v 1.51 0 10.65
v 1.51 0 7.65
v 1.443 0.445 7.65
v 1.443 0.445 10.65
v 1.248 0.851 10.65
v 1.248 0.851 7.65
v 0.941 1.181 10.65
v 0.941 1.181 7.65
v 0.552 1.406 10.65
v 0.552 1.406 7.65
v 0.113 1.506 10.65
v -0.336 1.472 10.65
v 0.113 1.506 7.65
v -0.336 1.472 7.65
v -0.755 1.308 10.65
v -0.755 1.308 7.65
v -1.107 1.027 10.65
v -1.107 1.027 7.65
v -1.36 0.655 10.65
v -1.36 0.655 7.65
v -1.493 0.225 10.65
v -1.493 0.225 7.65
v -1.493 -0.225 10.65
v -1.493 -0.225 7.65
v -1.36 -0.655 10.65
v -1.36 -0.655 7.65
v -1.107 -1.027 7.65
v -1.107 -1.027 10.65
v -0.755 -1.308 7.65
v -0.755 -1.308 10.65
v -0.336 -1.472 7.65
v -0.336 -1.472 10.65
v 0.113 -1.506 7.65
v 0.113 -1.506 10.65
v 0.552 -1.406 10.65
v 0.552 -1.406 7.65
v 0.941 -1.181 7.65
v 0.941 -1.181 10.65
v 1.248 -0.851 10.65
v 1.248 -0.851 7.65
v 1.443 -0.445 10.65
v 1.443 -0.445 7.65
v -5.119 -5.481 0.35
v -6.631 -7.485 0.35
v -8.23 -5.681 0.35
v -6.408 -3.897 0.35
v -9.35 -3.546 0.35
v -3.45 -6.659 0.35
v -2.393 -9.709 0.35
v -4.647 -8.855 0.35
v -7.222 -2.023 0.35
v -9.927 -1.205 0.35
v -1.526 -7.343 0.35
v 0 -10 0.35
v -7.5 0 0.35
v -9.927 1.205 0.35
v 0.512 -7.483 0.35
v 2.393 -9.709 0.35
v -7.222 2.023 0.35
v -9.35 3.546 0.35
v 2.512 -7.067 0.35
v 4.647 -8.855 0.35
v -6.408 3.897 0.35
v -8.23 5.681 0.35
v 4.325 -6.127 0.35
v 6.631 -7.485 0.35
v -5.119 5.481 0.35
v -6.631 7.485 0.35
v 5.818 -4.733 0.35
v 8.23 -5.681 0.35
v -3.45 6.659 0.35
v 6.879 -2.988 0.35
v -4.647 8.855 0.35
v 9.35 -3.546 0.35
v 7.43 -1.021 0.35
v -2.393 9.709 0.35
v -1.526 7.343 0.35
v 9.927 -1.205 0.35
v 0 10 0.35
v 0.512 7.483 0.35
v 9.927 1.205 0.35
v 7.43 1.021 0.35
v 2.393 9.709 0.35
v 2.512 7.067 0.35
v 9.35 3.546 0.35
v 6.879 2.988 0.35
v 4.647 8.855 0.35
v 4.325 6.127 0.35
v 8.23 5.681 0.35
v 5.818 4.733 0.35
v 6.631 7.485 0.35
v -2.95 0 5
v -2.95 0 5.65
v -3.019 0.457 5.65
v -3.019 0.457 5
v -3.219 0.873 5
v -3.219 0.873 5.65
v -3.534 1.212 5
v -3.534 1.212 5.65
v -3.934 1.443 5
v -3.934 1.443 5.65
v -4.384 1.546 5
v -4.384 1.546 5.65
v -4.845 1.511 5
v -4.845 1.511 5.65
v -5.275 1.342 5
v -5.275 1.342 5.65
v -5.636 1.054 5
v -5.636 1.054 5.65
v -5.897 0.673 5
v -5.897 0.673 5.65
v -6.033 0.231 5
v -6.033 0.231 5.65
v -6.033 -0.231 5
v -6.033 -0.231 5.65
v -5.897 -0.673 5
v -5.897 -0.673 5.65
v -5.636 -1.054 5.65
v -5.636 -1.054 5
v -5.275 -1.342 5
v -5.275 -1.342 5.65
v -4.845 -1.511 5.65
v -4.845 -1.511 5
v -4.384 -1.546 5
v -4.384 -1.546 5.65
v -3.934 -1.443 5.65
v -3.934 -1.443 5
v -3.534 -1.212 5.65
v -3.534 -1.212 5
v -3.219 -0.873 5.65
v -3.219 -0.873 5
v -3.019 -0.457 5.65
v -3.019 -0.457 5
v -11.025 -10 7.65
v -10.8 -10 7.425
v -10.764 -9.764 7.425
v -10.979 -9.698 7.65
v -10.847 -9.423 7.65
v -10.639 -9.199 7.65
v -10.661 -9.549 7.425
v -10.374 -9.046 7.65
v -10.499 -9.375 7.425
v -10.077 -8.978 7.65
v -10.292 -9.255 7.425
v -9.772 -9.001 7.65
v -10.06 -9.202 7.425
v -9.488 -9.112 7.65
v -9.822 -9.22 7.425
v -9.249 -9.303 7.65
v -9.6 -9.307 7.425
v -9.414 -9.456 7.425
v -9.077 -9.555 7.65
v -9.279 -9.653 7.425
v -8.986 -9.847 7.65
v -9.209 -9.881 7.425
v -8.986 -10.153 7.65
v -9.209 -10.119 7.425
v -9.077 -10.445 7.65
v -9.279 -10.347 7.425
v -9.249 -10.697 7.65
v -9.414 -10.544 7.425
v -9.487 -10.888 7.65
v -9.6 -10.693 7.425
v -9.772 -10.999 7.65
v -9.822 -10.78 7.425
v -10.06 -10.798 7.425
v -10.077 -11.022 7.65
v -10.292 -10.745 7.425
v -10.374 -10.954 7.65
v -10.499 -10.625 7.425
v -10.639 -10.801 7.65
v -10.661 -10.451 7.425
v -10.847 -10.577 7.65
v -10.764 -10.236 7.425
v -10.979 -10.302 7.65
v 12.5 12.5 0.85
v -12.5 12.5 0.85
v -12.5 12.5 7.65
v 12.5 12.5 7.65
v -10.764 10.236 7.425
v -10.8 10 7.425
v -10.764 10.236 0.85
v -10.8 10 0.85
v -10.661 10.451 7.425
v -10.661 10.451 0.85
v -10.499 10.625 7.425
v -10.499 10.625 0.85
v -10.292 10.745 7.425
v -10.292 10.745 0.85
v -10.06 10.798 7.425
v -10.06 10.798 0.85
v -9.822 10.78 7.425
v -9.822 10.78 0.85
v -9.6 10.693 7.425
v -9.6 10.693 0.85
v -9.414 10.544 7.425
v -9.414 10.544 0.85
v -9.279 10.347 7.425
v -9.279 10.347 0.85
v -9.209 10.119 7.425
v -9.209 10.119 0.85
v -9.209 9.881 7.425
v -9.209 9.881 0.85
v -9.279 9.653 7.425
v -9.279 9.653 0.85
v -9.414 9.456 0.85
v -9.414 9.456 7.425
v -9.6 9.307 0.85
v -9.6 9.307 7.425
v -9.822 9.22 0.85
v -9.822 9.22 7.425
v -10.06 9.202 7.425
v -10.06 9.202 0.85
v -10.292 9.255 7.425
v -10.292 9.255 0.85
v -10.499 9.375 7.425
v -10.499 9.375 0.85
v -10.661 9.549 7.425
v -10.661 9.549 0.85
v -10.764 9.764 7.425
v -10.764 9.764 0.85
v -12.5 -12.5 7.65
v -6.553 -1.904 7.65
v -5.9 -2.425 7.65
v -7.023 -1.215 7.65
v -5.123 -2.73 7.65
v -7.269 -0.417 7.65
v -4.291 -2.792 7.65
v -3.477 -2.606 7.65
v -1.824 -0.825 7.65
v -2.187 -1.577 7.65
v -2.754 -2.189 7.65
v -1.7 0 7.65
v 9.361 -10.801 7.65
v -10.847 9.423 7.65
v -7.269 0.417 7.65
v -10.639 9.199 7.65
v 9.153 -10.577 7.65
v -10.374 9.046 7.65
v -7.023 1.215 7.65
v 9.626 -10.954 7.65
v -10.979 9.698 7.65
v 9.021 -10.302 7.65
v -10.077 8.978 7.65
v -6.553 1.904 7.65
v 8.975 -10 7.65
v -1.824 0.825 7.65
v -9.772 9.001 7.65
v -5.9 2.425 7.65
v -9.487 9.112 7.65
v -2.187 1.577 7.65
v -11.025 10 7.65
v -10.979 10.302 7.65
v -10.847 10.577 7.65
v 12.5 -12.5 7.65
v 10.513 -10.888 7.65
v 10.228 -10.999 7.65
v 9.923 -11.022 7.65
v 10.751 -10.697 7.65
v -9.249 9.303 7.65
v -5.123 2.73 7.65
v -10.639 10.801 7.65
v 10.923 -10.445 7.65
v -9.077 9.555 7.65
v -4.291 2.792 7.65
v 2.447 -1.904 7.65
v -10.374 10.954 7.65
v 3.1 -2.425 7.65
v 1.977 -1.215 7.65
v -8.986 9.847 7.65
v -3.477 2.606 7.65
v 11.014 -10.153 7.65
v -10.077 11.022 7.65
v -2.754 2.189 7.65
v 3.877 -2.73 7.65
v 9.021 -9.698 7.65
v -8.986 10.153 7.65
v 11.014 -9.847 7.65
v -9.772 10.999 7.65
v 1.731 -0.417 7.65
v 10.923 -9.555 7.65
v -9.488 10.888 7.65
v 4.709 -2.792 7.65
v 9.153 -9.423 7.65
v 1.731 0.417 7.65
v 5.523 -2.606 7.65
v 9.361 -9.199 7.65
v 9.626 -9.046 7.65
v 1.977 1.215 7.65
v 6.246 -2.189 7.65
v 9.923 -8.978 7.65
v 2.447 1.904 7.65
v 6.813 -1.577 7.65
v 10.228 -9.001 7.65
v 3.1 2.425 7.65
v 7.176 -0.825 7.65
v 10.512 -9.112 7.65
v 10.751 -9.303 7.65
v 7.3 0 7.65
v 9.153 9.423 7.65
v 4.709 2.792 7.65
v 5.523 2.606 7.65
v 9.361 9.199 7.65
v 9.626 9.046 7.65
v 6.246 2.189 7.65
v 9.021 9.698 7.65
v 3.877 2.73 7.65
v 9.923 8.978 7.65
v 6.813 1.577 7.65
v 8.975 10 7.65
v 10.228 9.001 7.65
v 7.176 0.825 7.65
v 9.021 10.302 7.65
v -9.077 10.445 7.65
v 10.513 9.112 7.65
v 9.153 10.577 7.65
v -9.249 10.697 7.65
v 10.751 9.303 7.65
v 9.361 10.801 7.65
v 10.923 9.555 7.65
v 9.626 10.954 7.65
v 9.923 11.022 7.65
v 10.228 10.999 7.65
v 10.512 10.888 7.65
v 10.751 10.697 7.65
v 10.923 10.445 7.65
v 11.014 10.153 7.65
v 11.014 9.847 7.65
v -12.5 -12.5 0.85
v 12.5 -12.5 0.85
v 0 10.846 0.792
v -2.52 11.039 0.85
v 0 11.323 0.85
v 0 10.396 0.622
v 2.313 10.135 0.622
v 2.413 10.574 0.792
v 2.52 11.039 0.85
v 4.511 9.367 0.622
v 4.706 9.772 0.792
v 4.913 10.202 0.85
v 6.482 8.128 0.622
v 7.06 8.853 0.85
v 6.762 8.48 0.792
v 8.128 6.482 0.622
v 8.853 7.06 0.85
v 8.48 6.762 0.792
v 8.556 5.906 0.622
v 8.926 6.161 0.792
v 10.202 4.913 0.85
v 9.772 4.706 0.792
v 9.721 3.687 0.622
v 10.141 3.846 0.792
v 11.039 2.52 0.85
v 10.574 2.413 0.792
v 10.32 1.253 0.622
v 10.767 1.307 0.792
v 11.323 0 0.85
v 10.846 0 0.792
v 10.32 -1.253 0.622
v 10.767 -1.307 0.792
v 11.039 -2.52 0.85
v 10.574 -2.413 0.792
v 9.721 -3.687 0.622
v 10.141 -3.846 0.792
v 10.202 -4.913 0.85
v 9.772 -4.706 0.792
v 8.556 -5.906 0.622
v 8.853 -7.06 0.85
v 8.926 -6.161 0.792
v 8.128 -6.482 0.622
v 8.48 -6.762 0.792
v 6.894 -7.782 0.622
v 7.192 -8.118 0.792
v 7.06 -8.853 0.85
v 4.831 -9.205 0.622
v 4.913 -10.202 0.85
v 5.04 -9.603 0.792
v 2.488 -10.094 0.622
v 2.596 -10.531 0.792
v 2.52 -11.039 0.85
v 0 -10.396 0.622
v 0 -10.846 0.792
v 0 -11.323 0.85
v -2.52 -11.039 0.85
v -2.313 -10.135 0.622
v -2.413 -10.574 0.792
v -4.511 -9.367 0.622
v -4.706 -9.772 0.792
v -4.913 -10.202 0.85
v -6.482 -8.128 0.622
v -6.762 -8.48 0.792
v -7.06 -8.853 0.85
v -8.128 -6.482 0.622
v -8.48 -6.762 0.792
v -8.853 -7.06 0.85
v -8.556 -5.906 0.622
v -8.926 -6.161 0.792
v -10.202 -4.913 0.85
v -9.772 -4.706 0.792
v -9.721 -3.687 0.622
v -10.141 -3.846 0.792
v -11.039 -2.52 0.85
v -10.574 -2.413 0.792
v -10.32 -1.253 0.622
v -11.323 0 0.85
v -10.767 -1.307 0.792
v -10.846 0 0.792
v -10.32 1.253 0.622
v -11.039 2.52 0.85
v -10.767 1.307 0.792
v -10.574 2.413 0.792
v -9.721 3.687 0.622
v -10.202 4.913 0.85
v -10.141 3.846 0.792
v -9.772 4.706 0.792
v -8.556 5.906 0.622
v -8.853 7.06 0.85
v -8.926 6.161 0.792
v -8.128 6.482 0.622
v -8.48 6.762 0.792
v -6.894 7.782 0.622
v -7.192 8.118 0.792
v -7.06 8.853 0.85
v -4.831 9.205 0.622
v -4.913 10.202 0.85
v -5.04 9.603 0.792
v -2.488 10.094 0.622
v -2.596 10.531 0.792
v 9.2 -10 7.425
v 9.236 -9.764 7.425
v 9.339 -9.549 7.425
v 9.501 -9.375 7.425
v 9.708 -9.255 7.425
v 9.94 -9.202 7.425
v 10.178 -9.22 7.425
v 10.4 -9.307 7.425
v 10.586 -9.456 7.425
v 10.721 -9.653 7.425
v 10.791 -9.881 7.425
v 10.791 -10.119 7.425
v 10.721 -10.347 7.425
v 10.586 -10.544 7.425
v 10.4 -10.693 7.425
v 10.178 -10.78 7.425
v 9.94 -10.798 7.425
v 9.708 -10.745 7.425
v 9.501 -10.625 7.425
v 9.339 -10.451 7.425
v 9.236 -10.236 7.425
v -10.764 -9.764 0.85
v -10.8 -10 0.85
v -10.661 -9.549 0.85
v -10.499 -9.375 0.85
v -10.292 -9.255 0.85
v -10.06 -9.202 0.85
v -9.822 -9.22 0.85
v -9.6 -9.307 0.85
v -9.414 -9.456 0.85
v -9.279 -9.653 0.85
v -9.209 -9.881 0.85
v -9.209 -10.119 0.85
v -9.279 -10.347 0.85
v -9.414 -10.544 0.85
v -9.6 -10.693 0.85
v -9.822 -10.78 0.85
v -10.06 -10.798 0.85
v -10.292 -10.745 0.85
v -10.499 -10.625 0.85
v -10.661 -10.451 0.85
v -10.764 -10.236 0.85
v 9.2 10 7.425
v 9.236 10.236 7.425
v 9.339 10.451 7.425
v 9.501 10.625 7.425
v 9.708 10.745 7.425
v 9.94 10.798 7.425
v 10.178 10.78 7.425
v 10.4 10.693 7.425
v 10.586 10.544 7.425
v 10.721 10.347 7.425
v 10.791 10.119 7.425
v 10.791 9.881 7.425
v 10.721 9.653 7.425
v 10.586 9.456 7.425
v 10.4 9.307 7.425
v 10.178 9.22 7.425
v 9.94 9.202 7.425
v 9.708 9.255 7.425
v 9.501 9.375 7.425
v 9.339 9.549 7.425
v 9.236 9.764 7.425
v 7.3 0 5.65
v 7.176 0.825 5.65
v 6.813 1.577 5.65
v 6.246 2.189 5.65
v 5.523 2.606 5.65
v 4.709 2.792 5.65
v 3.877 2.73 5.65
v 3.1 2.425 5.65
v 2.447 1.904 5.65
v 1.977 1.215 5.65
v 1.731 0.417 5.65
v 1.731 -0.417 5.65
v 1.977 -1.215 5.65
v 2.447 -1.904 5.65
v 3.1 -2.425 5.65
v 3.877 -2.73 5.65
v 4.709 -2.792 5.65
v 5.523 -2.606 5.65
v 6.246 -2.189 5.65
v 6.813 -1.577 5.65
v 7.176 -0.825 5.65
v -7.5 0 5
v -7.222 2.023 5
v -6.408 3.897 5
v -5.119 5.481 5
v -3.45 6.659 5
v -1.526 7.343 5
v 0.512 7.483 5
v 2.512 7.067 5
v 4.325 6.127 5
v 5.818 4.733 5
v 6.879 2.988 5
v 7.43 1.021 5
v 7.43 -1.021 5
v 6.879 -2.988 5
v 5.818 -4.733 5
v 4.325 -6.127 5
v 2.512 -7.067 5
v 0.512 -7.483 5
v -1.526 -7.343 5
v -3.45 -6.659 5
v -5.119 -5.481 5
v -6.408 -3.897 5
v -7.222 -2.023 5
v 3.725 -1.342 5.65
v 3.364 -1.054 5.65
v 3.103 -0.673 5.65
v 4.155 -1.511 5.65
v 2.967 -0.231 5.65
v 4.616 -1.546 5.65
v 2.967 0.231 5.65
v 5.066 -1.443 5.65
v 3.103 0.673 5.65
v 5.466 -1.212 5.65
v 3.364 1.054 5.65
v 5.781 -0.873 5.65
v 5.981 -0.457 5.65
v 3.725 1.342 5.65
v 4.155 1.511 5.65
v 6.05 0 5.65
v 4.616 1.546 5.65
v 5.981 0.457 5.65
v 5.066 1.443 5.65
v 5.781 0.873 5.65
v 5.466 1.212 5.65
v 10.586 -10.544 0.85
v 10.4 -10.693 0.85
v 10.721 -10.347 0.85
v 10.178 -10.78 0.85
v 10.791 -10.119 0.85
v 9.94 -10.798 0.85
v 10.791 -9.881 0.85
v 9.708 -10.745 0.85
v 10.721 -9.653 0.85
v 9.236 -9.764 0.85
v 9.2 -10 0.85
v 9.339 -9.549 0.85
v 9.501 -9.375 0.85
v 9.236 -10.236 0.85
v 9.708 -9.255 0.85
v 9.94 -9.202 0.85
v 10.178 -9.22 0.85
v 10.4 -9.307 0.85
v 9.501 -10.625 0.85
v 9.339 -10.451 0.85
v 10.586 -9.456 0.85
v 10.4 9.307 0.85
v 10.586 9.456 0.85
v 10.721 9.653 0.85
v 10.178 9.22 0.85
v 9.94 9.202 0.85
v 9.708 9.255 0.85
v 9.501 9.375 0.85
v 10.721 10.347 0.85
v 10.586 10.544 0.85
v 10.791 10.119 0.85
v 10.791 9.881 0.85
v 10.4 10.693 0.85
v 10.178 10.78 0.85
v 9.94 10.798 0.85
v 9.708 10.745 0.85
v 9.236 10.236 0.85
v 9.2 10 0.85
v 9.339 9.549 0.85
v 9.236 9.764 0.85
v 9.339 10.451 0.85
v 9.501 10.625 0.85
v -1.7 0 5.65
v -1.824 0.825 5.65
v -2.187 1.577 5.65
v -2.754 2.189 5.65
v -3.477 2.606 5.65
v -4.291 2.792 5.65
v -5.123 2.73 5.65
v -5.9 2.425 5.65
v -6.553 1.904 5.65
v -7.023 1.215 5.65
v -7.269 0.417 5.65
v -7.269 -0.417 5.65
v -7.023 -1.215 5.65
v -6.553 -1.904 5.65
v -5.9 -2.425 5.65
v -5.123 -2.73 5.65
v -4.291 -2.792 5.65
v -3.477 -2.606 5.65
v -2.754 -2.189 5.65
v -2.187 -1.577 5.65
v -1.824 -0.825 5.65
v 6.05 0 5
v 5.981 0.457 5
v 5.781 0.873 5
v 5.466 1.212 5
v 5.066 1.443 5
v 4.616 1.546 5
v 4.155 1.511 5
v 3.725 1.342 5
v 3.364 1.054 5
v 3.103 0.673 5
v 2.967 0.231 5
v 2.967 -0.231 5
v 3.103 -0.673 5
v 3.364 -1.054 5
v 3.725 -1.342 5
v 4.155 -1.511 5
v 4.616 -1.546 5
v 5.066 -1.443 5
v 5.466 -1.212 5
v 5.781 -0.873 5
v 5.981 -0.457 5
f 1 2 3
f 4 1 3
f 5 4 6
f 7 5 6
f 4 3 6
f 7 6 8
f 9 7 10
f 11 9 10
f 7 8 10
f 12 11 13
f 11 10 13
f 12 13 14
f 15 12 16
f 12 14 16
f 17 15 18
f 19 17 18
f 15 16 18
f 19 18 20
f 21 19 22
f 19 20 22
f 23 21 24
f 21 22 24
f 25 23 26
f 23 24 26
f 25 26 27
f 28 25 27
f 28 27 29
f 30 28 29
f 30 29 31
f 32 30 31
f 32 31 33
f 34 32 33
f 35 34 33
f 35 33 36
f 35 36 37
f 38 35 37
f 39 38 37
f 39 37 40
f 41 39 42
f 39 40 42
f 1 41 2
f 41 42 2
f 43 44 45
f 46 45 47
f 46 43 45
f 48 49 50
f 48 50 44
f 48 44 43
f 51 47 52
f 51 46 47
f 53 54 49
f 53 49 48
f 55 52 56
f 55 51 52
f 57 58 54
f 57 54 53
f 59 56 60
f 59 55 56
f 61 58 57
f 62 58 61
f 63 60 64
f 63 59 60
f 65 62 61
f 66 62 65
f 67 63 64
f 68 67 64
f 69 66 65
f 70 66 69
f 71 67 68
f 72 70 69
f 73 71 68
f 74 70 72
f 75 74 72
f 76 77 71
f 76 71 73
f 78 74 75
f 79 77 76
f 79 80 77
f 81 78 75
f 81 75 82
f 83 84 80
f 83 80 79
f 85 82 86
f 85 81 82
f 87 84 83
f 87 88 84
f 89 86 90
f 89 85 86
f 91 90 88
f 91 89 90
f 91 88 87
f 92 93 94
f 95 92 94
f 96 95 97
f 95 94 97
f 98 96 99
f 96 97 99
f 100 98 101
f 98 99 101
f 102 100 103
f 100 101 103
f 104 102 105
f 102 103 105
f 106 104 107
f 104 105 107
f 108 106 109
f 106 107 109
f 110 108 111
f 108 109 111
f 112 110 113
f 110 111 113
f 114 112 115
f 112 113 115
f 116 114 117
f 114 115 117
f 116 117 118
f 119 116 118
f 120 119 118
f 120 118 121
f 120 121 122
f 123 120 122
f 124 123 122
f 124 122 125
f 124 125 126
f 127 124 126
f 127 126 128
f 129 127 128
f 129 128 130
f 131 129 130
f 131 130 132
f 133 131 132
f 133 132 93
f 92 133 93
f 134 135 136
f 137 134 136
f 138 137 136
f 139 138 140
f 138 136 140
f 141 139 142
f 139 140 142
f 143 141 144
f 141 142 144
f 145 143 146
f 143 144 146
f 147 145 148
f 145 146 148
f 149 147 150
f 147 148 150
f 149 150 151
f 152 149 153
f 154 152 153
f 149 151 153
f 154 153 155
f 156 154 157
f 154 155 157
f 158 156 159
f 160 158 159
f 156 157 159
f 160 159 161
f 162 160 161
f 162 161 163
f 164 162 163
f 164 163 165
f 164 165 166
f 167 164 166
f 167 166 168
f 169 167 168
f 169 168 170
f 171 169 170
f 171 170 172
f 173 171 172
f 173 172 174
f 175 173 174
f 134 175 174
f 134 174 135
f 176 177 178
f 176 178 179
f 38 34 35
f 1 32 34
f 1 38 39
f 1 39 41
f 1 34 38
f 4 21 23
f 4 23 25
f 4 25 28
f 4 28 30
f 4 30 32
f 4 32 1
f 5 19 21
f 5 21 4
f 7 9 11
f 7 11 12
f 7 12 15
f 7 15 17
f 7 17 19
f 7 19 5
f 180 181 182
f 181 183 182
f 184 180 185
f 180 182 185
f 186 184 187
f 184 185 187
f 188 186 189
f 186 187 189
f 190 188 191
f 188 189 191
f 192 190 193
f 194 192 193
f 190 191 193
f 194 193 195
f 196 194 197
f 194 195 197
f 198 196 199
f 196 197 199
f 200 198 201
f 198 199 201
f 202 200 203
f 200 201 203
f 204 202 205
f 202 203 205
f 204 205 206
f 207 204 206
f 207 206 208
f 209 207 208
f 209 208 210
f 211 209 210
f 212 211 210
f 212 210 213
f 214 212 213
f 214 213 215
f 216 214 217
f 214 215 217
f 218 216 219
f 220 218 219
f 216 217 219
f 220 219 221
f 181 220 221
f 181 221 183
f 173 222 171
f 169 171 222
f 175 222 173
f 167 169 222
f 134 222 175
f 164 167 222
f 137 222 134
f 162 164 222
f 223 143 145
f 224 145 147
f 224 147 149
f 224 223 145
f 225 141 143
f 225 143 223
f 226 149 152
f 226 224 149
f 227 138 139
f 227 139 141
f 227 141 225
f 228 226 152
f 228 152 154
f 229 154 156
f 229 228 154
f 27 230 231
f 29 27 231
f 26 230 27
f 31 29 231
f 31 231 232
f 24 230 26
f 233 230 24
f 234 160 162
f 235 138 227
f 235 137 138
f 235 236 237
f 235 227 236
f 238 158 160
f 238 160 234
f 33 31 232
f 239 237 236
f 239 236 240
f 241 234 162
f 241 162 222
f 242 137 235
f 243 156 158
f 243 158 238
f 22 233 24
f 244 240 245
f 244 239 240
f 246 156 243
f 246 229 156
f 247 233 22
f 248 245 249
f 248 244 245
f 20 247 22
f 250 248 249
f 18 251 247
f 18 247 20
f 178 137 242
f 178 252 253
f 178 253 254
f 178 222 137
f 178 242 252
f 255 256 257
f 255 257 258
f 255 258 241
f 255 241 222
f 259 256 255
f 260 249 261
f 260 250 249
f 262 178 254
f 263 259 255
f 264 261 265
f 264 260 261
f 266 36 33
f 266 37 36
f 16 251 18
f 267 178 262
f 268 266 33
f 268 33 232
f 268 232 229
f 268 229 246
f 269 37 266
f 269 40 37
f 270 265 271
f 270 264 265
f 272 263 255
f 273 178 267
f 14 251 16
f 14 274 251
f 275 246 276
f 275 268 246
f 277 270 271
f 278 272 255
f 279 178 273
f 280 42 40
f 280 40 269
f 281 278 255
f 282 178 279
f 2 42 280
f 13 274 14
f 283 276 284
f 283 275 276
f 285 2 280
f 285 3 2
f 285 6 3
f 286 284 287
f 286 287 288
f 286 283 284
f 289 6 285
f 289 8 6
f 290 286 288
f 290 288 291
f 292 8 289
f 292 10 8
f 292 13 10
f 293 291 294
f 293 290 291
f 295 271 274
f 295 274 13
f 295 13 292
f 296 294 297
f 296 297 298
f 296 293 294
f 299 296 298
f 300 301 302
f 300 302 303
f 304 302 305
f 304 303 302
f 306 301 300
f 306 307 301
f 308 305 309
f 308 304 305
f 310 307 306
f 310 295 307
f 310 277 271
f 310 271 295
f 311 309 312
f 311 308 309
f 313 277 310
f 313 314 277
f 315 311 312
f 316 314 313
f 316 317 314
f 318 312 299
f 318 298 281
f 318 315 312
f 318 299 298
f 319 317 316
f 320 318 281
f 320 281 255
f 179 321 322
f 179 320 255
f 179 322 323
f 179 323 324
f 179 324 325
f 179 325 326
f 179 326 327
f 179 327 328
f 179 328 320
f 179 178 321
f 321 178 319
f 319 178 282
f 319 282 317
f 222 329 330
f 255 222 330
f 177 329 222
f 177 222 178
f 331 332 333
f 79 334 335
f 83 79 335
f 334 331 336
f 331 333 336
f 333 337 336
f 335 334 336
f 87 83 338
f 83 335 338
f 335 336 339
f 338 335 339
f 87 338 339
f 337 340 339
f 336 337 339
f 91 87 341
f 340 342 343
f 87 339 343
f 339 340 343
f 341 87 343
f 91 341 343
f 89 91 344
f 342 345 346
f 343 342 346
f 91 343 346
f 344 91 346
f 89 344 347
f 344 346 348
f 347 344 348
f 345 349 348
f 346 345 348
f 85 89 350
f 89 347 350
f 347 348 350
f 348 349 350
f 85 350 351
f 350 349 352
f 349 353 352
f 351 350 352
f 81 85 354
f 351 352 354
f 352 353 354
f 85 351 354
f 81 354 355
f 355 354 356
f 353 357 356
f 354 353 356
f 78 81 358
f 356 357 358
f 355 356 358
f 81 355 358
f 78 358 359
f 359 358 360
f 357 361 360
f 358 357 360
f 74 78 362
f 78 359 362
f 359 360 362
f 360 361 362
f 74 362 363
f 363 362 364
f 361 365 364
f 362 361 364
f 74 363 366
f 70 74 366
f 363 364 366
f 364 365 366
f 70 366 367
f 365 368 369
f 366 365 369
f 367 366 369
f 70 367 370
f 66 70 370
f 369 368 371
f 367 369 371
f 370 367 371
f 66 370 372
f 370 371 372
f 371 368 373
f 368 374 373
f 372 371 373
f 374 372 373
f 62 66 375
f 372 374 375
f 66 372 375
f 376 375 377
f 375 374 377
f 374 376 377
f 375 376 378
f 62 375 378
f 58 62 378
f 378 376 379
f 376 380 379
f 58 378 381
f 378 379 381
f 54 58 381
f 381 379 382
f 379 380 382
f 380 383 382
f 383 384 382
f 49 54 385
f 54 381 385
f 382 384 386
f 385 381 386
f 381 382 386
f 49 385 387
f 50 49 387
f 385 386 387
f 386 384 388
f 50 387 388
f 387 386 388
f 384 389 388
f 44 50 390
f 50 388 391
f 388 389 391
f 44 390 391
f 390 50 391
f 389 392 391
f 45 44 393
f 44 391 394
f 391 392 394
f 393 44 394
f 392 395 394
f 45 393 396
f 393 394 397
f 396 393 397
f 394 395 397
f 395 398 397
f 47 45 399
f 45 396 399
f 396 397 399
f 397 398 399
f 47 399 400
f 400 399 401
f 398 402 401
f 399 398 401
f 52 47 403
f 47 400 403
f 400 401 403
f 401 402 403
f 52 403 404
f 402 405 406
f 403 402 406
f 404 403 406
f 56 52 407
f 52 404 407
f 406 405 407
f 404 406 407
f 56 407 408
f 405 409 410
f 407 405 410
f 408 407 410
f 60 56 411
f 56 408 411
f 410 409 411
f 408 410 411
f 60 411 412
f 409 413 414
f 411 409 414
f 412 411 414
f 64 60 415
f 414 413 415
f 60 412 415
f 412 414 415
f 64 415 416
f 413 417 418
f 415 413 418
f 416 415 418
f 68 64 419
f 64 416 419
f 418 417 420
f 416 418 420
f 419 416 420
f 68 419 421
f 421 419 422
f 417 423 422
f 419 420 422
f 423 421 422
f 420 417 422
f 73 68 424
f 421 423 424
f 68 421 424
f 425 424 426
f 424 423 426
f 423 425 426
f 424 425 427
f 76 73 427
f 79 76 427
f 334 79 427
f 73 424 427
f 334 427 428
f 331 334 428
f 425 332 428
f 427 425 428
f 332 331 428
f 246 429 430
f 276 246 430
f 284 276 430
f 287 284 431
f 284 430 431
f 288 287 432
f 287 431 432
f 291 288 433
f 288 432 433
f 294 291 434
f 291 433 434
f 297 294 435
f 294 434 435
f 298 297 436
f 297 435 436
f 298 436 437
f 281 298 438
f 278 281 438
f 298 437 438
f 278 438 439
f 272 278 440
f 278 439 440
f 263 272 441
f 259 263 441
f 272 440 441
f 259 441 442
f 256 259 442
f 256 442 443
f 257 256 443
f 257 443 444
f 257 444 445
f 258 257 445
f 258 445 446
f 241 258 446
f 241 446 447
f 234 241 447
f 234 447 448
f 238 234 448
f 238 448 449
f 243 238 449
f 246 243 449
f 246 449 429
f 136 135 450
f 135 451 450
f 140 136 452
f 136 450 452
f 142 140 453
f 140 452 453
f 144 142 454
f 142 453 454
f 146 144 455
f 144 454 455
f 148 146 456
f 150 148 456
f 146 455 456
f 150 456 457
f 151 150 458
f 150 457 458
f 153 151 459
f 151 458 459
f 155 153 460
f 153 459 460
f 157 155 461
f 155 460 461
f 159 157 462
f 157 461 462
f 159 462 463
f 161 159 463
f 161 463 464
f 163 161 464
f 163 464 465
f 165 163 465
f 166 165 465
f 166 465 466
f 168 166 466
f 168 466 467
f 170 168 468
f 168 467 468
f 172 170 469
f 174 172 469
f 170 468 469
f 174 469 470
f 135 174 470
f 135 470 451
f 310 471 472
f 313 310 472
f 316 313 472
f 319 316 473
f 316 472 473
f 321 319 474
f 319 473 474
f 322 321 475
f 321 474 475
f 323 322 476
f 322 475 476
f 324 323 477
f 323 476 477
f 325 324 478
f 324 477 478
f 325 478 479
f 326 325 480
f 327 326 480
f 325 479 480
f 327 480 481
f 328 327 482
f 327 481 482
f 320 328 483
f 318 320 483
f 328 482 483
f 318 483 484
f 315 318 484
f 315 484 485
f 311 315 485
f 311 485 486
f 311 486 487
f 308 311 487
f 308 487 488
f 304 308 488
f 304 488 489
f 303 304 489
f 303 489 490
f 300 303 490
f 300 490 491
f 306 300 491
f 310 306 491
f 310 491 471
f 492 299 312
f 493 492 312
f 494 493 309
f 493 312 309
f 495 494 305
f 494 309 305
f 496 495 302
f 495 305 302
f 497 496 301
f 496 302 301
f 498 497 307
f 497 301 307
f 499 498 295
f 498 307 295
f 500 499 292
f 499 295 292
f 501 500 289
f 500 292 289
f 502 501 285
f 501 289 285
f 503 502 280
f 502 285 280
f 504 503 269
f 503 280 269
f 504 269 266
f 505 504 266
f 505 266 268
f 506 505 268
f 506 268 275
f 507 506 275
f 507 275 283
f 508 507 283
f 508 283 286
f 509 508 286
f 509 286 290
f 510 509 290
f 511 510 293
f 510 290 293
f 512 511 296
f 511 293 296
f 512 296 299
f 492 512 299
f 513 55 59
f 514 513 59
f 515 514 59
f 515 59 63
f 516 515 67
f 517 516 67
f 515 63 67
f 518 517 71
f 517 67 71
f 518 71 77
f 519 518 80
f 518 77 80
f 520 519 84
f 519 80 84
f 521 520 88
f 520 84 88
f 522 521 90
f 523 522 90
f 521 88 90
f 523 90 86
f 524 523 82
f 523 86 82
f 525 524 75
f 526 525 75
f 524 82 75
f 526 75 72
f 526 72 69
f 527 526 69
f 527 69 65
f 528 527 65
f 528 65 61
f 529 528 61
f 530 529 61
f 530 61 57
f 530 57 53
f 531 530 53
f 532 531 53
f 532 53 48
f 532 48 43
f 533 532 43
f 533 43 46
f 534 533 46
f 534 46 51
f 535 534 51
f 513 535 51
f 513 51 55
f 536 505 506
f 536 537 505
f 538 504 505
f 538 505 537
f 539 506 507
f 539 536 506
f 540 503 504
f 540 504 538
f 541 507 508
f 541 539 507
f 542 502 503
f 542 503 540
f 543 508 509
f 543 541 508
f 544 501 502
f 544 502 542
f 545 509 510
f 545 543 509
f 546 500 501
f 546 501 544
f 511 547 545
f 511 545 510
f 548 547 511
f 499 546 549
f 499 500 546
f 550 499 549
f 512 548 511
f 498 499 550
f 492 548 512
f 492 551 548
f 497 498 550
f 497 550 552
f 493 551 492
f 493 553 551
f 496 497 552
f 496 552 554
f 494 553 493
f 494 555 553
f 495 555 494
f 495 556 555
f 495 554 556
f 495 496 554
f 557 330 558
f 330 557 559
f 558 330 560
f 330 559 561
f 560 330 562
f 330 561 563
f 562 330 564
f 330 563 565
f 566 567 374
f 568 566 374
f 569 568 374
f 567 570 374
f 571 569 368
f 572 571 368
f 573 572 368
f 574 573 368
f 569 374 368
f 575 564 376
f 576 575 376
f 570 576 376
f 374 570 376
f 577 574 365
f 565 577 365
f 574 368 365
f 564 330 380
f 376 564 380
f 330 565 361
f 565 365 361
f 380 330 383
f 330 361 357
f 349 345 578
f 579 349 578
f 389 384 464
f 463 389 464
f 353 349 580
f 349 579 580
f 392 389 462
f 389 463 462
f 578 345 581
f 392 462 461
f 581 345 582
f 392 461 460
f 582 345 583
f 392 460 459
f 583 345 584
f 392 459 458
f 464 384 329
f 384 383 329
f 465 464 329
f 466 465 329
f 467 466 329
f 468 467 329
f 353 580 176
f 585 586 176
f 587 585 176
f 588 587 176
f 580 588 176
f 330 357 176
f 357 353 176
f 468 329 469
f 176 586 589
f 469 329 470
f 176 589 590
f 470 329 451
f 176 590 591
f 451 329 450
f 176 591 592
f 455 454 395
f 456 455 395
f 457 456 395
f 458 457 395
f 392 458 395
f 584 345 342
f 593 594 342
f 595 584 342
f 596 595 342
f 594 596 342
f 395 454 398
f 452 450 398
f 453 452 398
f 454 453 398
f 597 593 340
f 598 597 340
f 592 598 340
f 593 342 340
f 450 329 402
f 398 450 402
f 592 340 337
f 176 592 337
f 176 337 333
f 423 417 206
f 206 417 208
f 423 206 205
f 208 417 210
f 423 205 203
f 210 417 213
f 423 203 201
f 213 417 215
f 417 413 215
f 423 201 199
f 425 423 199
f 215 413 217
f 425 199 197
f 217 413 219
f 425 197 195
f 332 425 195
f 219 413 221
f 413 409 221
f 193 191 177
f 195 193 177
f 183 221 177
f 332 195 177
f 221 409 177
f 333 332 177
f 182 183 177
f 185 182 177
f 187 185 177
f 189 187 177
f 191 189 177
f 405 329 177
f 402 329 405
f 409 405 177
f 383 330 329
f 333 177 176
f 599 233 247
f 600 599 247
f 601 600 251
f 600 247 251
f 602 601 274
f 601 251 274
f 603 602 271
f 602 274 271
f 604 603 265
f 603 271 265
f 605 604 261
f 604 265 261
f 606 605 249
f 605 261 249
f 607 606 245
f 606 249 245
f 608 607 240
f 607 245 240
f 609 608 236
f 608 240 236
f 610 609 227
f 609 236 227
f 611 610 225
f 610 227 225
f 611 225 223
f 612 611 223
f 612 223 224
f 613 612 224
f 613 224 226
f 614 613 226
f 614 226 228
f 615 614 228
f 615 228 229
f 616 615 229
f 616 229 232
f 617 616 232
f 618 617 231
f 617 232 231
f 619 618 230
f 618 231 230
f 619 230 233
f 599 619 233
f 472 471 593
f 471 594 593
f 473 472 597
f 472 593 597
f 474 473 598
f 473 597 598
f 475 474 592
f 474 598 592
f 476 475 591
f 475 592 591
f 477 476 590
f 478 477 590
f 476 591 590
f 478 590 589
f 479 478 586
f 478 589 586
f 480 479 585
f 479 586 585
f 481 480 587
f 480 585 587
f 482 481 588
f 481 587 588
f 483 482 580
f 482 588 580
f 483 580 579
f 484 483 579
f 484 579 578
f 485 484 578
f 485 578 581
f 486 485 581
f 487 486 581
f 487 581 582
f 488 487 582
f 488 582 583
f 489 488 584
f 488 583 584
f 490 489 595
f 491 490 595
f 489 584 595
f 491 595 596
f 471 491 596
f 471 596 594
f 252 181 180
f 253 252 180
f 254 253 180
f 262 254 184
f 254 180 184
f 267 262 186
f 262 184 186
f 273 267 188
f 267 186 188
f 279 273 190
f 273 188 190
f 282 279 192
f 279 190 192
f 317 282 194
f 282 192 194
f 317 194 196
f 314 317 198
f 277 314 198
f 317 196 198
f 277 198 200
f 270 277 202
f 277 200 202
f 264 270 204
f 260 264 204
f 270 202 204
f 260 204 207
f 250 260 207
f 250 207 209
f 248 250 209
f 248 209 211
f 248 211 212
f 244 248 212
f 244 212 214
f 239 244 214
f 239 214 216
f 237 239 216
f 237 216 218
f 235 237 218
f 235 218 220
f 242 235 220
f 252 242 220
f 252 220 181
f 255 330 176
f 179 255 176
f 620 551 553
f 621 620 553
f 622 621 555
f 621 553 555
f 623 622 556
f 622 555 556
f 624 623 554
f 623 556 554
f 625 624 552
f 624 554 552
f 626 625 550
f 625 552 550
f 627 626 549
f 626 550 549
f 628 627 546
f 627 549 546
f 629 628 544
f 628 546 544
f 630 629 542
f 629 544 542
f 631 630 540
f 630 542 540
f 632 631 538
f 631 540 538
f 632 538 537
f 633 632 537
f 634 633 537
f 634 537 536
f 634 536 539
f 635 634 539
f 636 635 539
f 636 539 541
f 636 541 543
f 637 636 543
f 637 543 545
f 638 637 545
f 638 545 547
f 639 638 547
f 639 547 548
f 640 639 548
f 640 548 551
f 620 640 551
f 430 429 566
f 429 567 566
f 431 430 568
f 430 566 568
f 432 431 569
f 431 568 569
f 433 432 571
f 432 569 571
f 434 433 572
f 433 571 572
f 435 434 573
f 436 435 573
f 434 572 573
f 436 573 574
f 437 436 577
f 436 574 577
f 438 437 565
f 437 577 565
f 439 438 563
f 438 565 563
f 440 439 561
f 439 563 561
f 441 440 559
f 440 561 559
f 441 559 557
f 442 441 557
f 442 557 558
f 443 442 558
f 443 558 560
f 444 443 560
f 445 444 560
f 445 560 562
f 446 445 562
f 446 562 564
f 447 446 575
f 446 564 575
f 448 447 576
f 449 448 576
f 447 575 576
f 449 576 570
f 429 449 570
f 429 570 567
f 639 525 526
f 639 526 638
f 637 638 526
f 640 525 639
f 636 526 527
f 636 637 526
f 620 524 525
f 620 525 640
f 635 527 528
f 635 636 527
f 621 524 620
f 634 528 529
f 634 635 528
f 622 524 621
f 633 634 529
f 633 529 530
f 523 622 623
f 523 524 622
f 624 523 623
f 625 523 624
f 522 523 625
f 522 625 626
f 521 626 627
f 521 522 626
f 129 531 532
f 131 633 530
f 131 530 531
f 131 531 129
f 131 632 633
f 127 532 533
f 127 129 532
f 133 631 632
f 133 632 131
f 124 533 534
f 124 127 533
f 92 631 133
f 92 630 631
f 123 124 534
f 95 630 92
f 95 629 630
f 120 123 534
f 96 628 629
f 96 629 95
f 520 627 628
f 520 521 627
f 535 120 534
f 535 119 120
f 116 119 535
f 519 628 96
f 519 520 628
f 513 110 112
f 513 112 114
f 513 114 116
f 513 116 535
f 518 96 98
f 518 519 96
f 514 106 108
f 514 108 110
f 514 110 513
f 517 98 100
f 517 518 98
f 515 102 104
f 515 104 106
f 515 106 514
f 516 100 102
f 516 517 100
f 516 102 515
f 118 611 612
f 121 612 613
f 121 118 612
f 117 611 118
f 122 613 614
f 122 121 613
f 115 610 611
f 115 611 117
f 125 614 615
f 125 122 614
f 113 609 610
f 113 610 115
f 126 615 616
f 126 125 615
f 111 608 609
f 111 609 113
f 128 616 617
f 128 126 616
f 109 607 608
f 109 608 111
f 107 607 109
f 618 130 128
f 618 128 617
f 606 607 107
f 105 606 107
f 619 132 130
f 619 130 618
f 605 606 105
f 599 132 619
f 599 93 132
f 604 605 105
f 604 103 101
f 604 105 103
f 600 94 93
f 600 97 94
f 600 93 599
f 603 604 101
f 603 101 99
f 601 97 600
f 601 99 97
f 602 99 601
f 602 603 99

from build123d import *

# Parameters (mm, degrees)
SKETCH_1_W                   = 25
SKETCH_1_H                   = 25
SKETCH_1_R                   = 1.5
EXTRUDE_1_DEPTH              = 7.65
SKETCH_2_R                   = 1.51
EXTRUDE_2_DEPTH              = 3
SKETCH_3_R                   = 7.5
CUT_EXTRUDE_1_DEPTH          = 5
SKETCH_4_R                   = 2.8
CUT_EXTRUDE_2_DEPTH          = 2
SKETCH_5_R                   = 1.55
CUT_EXTRUDE_3_DEPTH          = 2
SKETCH_6_W                   = 7.593154143
SKETCH_6_H                   = 30.65177665
CUT_EXTRUDE_4_DEPTH          = 30.911076544
EXTRUDE_START                = 0.5
SKETCH_7_R                   = 10
SKETCH_7_R_2                 = 7.5
EXTRUDE_3_DEPTH              = 0.5
FILLET_4_R                   = 2
HOLE_WIZARD_M2_1_D           = 1.6
HOLE_WIZARD_M2_1_CSINK_D     = 2.05
HOLE_WIZARD_M2_1_CSINK_ANGLE = 90


with BuildPart() as part:
    # 草图1 → 凸台-拉伸1 (new body)
    # profile 1 of 2: a face of its own
    with BuildSketch(Plane.XY):
        Rectangle(SKETCH_1_W, SKETCH_1_H)
        Circle(SKETCH_1_R, mode=Mode.SUBTRACT)
    # profile 2 of 2: a face of its own
    with BuildSketch(Plane.XY):
        Circle(SKETCH_1_R)
    extrude(amount=EXTRUDE_1_DEPTH)

    # 草图2 → 凸台-拉伸2 (add)
    with BuildSketch(Plane.XY.offset(7.65)):
        Circle(SKETCH_2_R)
    extrude(amount=EXTRUDE_2_DEPTH)

    # 草图3 → 切除-拉伸1 (cut)
    with BuildSketch(Plane(origin=(0, 0, 0), x_dir=(-1, 0, 0), z_dir=(0, 0, -1))):
        Circle(SKETCH_3_R)
    extrude(amount=-CUT_EXTRUDE_1_DEPTH, mode=Mode.SUBTRACT)

    # 草图4 → 切除-拉伸2 (cut)
    with BuildSketch(Plane.XY.offset(7.65)):
        with Locations((4.5, 0)):
            Circle(SKETCH_4_R)
        with Locations((-4.5, 0)):
            Circle(SKETCH_4_R)
    extrude(amount=-CUT_EXTRUDE_2_DEPTH, mode=Mode.SUBTRACT)

    # 草图5 → 切除-拉伸3 (cut)
    with BuildSketch(Plane.XY.offset(5.65)):
        with Locations((4.5, 0)):
            Circle(SKETCH_5_R)
        with Locations((-4.5, 0)):
            Circle(SKETCH_5_R)
    extrude(amount=-CUT_EXTRUDE_3_DEPTH, mode=Mode.SUBTRACT)

    # 草图6 → 切除-拉伸4 (cut, through all)
    with BuildSketch(Plane.ZY.offset(12.5)):
        with Locations((-2.946577072, 0.223328063)):
            Rectangle(SKETCH_6_W, SKETCH_6_H)
    extrude(amount=-CUT_EXTRUDE_4_DEPTH, mode=Mode.SUBTRACT)

    # 草图7 → 凸台-拉伸3 (add)
    with BuildSketch(Plane(origin=(0, 0, 0.85), x_dir=(-1, 0, 0), z_dir=(0, 0, -1)).offset(EXTRUDE_START)):
        with Locations(Location((0, 0, 0), (0, 0, 90))):
            Circle(SKETCH_7_R)
        Circle(SKETCH_7_R_2, mode=Mode.SUBTRACT)
    extrude(amount=-EXTRUDE_3_DEPTH)

    # 圆角4
    # the kernel refuses this fillet: 2 mm, written as the material it adds along each edge
    with BuildSketch(Plane(origin=(0, 0, 0.85), x_dir=(0, 1, 0), z_dir=(-1, 0, 0))) as fillet_4_piece_1:
        with BuildLine():
            CenterArc((11.322875656, 2), FILLET_4_R, 228.590377891, 41.409622109)
            Line((11.322875656, 0), (11.322875656, -0.04))
            Line((11.322875656, -0.04), (10, -0.04))
            Line((10, -0.04), (9.96, 0))
            ThreePointArc((9.96, 0), (9.96, 0.25), (9.973542487, 0.47))
            Line((9.973542487, 0.47), (10, 0.5))
        make_face()
    revolve(axis=Axis((0, 0, 0.85), (0, 0, -1)))

    # M2 螺纹孔1 (through all)
    with Locations(Plane.XY.offset(7.65)):
        with Locations((-10, 10), (10, 10), (-10, -10), (10, -10)):
            CounterSinkHole(HOLE_WIZARD_M2_1_D / 2, HOLE_WIZARD_M2_1_CSINK_D / 2, counter_sink_angle=HOLE_WIZARD_M2_1_CSINK_ANGLE)


solid = part.part
